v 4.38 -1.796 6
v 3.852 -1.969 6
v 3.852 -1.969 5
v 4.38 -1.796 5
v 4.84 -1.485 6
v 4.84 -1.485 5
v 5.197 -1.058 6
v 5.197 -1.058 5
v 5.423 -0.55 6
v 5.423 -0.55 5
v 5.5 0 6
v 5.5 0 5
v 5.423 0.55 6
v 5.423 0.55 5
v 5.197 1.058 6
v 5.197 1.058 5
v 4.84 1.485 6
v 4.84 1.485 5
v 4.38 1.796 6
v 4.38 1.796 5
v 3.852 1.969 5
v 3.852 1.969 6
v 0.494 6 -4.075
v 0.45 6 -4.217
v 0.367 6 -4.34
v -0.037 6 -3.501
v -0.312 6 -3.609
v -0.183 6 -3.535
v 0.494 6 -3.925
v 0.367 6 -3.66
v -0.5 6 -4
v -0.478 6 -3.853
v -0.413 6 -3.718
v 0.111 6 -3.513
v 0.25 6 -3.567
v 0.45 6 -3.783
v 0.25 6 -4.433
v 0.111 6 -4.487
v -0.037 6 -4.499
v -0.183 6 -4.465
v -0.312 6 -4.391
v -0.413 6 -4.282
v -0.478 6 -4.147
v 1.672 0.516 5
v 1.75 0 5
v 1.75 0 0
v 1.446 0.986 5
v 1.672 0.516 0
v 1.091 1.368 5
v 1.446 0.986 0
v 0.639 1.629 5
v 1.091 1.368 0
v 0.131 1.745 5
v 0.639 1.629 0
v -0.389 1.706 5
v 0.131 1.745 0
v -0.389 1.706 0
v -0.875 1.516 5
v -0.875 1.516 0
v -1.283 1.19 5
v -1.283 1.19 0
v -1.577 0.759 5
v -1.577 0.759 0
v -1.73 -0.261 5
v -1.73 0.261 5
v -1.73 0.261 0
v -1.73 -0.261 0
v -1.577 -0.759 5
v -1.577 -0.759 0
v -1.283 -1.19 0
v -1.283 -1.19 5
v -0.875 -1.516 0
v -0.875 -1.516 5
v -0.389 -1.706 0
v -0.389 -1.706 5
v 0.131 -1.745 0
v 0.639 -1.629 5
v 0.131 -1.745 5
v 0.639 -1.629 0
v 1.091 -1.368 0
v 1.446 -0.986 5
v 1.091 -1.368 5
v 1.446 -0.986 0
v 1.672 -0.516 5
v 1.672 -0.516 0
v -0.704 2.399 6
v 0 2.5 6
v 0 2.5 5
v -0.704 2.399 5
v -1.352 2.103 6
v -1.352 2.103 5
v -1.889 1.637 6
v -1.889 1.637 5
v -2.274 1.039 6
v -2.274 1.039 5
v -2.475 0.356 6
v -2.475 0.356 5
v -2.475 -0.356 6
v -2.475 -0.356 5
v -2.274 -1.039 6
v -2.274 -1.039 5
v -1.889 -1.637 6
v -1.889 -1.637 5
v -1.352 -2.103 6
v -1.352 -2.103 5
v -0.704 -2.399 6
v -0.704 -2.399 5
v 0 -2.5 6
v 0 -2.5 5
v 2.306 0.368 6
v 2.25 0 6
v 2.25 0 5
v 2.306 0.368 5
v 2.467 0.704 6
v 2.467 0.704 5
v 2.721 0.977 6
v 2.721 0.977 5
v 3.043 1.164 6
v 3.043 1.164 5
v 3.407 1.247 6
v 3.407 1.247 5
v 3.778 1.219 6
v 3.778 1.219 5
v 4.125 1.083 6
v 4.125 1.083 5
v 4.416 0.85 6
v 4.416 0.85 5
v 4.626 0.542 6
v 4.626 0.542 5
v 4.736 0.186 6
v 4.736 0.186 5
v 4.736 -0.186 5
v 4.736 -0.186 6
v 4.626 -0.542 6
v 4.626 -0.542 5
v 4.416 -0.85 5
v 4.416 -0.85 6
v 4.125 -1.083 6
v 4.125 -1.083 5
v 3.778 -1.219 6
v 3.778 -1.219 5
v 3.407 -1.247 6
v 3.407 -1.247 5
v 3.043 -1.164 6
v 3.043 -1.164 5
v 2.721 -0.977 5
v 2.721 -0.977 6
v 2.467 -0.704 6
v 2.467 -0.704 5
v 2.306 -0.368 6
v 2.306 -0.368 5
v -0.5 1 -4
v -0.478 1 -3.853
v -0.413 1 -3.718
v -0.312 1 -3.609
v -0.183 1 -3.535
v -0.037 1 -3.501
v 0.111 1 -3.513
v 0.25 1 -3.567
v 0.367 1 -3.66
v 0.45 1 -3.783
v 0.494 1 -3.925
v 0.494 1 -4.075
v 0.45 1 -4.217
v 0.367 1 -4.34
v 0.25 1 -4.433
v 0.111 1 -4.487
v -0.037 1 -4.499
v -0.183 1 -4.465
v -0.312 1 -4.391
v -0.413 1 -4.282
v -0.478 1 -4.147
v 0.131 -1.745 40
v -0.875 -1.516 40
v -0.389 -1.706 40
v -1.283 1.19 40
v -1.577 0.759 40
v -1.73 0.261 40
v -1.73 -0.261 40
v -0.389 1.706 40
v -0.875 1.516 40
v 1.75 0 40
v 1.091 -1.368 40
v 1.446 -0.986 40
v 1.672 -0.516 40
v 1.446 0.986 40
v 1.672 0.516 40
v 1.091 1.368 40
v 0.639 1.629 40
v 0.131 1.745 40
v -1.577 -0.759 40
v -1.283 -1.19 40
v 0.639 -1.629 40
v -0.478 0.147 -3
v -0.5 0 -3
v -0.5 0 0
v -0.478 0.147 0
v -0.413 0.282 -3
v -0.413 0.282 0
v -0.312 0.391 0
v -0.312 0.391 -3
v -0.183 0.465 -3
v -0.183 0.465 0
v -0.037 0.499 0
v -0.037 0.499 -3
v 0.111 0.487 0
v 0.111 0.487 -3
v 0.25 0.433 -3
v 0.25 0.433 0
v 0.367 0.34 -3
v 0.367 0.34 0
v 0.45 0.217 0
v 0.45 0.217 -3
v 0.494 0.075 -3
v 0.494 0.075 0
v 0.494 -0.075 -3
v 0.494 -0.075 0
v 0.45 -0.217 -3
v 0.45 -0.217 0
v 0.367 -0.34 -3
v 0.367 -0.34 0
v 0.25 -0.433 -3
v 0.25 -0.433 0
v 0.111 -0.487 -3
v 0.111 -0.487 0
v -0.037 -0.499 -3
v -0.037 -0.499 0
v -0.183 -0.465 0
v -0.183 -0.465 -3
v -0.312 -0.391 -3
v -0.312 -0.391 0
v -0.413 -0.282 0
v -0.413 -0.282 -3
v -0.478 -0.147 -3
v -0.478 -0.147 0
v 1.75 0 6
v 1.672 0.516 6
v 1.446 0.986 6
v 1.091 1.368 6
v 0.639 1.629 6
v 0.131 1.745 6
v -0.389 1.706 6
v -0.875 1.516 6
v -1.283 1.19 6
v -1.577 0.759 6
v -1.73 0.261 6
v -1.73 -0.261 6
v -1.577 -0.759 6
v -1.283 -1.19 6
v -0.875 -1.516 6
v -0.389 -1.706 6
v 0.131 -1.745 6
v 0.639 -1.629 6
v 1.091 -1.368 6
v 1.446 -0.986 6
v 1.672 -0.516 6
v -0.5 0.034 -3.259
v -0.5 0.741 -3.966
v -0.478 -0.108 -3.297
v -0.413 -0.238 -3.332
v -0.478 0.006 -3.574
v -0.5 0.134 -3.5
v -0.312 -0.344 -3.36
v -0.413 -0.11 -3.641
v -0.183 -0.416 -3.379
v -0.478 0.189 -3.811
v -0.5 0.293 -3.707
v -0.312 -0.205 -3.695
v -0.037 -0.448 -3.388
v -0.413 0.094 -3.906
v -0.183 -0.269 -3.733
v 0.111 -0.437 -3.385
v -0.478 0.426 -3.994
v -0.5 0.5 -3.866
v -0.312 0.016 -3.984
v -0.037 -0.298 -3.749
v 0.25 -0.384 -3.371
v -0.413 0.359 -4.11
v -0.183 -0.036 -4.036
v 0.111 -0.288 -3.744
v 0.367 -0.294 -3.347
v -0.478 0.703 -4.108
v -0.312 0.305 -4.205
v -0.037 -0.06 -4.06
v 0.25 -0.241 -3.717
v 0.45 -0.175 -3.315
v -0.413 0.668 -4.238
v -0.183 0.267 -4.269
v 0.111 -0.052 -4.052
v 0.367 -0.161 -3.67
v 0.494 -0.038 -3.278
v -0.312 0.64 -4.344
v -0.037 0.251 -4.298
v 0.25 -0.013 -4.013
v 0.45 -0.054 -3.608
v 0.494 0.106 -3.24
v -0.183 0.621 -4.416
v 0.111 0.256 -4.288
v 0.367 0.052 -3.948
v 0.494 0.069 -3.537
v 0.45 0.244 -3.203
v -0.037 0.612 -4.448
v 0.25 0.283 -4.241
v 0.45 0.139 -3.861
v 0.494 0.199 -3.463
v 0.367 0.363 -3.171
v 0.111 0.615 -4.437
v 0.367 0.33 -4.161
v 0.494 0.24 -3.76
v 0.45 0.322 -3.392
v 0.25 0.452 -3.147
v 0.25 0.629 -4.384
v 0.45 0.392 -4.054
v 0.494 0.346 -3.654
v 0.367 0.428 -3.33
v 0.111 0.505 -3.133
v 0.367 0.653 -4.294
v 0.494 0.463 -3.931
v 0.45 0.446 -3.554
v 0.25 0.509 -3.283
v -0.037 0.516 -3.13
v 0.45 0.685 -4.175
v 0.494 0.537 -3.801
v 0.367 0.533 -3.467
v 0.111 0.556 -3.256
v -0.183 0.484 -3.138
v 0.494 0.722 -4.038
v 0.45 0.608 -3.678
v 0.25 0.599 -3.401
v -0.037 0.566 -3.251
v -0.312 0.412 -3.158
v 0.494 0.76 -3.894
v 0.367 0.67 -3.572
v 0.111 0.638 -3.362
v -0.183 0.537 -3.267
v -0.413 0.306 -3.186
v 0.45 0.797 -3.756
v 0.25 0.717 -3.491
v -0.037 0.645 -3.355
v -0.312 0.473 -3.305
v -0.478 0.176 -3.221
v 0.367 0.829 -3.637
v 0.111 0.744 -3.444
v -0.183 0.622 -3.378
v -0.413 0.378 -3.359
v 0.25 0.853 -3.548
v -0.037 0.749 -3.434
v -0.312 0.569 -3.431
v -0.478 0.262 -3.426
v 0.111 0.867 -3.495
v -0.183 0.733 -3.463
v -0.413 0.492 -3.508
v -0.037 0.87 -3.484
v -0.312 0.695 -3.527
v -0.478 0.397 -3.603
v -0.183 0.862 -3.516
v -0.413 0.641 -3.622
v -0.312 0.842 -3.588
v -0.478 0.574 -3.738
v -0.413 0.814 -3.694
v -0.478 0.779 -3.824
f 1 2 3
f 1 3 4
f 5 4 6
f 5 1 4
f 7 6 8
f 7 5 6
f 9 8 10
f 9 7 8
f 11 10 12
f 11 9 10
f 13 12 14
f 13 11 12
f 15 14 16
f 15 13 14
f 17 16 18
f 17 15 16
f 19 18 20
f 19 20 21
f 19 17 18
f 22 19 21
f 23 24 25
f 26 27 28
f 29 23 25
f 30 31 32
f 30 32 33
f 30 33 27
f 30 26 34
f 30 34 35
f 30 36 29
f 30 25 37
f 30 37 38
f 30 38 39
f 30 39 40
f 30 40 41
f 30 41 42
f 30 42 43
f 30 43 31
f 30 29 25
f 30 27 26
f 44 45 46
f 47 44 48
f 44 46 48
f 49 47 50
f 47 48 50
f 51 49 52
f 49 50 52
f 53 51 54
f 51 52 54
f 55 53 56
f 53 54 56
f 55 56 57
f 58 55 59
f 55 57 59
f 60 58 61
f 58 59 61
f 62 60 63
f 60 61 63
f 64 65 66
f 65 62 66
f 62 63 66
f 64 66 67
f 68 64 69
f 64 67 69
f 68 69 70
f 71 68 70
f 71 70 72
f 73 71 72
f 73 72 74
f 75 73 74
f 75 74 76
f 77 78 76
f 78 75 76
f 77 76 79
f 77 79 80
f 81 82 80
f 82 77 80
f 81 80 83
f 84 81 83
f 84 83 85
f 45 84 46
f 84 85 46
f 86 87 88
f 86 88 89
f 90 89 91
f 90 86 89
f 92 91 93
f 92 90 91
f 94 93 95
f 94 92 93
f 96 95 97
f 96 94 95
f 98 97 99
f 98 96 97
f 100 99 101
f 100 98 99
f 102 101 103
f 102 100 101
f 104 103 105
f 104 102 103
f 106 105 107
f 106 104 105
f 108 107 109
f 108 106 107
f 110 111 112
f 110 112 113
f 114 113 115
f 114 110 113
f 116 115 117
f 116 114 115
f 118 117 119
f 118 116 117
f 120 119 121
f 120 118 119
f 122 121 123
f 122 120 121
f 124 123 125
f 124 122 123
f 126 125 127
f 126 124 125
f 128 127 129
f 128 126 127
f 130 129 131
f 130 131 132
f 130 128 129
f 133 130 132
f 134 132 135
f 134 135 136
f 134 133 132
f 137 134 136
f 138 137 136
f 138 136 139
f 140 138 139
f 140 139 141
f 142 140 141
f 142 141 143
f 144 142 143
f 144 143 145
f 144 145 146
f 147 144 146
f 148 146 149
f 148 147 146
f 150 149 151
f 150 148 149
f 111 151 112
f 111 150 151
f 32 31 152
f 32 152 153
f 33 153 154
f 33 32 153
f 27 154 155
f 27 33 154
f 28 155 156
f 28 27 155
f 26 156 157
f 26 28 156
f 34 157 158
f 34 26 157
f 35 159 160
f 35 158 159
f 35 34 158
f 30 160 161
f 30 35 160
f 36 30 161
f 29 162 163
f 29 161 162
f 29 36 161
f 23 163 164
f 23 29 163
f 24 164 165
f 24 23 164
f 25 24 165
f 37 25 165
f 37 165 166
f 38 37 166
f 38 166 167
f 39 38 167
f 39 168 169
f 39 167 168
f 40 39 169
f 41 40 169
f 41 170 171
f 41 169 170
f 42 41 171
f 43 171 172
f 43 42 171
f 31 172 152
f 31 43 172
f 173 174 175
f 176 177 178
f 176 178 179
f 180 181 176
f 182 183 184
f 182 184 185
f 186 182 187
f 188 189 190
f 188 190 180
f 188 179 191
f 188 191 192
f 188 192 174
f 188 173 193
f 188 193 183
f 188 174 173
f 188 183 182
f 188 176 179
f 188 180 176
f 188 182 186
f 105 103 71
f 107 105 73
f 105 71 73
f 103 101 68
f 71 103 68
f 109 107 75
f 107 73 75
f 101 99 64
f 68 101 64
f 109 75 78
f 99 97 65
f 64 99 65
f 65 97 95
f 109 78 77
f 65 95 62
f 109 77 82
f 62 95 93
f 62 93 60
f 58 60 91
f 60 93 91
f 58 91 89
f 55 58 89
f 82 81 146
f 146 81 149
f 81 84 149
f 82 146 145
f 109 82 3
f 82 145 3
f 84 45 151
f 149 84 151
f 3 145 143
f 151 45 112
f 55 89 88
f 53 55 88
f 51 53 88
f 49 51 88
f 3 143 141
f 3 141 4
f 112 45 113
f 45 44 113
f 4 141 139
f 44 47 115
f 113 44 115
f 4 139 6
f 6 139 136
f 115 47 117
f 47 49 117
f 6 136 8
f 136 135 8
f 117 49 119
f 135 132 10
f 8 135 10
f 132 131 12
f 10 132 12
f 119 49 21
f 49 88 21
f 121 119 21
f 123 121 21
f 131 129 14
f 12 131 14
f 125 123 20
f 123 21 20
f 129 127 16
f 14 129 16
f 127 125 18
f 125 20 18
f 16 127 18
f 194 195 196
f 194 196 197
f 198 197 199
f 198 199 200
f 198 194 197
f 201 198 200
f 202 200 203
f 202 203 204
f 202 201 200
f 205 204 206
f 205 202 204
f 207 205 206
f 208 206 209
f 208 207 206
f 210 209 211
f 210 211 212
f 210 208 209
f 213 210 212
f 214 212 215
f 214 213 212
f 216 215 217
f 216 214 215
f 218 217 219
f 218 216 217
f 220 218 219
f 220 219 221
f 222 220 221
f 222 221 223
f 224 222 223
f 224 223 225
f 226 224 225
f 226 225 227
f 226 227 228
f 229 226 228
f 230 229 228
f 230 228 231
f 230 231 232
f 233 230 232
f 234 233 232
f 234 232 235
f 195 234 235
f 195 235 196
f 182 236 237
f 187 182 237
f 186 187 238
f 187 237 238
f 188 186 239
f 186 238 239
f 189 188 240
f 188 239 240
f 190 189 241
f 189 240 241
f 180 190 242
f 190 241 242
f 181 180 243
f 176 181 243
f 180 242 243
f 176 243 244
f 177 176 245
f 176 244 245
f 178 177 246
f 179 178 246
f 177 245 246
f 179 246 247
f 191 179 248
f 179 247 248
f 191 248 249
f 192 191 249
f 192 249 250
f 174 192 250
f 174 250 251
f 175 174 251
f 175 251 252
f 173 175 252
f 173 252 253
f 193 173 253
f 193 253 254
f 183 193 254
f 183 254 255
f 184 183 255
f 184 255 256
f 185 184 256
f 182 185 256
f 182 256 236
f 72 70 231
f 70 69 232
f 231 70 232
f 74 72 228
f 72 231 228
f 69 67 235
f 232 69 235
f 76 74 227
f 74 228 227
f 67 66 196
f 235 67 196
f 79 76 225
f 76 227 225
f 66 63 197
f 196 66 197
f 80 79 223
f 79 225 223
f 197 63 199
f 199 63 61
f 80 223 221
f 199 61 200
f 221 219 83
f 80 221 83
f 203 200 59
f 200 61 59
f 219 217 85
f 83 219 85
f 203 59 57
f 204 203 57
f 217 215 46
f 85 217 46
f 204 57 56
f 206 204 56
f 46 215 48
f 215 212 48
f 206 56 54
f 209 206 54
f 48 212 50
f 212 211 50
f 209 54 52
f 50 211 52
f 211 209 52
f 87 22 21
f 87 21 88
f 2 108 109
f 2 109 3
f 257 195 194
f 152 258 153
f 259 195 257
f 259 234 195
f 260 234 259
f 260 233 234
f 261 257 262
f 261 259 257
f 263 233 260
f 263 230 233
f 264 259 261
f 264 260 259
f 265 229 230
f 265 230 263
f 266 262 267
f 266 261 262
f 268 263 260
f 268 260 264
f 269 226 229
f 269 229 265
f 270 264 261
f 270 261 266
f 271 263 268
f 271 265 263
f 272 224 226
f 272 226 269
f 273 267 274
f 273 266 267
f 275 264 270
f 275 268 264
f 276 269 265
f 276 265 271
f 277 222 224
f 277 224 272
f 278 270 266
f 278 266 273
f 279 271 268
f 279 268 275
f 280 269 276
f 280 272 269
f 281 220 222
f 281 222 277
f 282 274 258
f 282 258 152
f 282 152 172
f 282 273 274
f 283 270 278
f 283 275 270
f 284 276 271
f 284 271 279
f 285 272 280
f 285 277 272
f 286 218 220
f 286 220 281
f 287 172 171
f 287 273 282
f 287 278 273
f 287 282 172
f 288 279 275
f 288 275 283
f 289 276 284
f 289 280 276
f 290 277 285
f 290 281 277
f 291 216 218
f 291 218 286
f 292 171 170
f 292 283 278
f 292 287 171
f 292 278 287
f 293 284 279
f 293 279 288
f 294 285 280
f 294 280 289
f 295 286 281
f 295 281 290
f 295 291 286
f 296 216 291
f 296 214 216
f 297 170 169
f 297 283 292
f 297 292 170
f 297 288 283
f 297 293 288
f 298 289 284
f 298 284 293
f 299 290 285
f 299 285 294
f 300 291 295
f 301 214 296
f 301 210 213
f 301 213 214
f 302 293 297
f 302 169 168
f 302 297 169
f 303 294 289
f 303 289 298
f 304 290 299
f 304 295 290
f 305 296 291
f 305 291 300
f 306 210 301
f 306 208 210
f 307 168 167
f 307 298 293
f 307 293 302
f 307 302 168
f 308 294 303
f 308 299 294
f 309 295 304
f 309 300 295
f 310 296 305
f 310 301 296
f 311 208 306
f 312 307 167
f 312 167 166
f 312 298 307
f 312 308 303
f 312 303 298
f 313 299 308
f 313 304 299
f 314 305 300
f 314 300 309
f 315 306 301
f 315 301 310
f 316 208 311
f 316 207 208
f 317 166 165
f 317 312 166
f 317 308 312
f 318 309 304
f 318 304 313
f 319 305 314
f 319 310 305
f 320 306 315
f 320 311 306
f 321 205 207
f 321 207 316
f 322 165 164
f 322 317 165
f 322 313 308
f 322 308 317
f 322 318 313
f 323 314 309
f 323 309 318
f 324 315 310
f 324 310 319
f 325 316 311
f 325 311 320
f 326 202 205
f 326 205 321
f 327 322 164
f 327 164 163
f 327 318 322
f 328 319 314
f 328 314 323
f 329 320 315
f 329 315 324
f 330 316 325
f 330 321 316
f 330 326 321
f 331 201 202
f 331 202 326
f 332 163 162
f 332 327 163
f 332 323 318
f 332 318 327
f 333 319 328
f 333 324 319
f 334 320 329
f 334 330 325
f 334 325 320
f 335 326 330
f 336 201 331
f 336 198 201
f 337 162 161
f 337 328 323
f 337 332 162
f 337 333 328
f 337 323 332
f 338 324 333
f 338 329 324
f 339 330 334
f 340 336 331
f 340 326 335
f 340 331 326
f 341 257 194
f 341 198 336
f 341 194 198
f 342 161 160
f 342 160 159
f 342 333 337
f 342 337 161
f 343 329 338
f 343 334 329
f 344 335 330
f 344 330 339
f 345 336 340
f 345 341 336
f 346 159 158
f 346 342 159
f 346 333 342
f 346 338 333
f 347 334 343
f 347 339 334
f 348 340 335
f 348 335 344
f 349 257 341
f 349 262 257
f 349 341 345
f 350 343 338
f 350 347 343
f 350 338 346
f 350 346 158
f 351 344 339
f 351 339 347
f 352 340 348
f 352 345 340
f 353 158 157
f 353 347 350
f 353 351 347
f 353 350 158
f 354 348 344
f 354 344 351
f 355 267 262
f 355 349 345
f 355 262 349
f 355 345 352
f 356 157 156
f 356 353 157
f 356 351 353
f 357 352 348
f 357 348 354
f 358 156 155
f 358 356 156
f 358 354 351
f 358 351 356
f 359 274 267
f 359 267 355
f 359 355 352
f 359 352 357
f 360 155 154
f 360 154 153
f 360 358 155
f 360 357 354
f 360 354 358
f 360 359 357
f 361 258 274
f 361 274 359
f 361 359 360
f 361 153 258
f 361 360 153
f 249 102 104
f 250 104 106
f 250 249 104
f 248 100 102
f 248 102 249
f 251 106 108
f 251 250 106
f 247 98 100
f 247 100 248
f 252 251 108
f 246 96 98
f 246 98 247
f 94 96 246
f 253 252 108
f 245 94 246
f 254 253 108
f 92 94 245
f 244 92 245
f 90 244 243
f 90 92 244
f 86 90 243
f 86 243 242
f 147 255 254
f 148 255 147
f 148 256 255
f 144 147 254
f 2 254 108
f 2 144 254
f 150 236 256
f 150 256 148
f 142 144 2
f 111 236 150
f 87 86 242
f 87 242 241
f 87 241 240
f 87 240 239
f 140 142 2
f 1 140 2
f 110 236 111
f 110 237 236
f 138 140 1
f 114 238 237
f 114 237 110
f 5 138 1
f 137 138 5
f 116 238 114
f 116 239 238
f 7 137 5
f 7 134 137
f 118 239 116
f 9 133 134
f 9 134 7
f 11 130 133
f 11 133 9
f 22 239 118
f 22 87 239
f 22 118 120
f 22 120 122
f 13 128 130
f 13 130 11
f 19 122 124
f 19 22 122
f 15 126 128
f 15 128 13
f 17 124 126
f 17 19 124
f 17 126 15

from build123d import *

# Parameters (mm, degrees)
SKETCH1_R           = 1.75
BOSS_EXTRUDE1_DEPTH = 40
SKETCH16_R          = 1.25
BOSS_EXTRUDE2_DEPTH = 1
SWEEP1_PROFILE_R    = 0.5


with BuildPart() as part:
    # Sketch1 → Boss-Extrude1 (new body)
    with BuildSketch(Plane.XY):
        Circle(SKETCH1_R)
    extrude(amount=BOSS_EXTRUDE1_DEPTH)

    # Sketch16 → Boss-Extrude2 (add)
    with BuildSketch(Plane(origin=(0, 0, 6), x_dir=(-1, 0, 0), z_dir=(0, 0, -1))):
        with BuildLine():
            Line((-3.851561771, 1.968858634), (0, 2.5))
            ThreePointArc((0, 2.5), (2.5, 0), (0, -2.5))
            Line((0, -2.5), (-3.851561771, -1.968858634))
            ThreePointArc((-3.851561771, -1.968858634), (-5.5, 0), (-3.851561771, 1.968858634))
        make_face()
        with Locations((-3.5, 0)):
            Circle(SKETCH16_R, mode=Mode.SUBTRACT)
    extrude(amount=BOSS_EXTRUDE2_DEPTH)

    # Sweep1: sweep along a curve in space
    with BuildLine() as sweep1_path:
        Line((0, 0, 0), (0, 0, -3))
        ThreePointArc((0, 0, -3), (0, 0.292893219, -3.707106781), (0, 1, -4))
        Line((0, 1, -4), (0, 6, -4))
    # Sweep1 profile (on start of the path) → Sweep1 (sweep)
    with BuildSketch(Plane(origin=(0, 0, 0), x_dir=(-1, 0, 0), z_dir=(0, 0, -1))):
        Circle(SWEEP1_PROFILE_R)
    sweep(path=sweep1_path.line)


solid = part.part
